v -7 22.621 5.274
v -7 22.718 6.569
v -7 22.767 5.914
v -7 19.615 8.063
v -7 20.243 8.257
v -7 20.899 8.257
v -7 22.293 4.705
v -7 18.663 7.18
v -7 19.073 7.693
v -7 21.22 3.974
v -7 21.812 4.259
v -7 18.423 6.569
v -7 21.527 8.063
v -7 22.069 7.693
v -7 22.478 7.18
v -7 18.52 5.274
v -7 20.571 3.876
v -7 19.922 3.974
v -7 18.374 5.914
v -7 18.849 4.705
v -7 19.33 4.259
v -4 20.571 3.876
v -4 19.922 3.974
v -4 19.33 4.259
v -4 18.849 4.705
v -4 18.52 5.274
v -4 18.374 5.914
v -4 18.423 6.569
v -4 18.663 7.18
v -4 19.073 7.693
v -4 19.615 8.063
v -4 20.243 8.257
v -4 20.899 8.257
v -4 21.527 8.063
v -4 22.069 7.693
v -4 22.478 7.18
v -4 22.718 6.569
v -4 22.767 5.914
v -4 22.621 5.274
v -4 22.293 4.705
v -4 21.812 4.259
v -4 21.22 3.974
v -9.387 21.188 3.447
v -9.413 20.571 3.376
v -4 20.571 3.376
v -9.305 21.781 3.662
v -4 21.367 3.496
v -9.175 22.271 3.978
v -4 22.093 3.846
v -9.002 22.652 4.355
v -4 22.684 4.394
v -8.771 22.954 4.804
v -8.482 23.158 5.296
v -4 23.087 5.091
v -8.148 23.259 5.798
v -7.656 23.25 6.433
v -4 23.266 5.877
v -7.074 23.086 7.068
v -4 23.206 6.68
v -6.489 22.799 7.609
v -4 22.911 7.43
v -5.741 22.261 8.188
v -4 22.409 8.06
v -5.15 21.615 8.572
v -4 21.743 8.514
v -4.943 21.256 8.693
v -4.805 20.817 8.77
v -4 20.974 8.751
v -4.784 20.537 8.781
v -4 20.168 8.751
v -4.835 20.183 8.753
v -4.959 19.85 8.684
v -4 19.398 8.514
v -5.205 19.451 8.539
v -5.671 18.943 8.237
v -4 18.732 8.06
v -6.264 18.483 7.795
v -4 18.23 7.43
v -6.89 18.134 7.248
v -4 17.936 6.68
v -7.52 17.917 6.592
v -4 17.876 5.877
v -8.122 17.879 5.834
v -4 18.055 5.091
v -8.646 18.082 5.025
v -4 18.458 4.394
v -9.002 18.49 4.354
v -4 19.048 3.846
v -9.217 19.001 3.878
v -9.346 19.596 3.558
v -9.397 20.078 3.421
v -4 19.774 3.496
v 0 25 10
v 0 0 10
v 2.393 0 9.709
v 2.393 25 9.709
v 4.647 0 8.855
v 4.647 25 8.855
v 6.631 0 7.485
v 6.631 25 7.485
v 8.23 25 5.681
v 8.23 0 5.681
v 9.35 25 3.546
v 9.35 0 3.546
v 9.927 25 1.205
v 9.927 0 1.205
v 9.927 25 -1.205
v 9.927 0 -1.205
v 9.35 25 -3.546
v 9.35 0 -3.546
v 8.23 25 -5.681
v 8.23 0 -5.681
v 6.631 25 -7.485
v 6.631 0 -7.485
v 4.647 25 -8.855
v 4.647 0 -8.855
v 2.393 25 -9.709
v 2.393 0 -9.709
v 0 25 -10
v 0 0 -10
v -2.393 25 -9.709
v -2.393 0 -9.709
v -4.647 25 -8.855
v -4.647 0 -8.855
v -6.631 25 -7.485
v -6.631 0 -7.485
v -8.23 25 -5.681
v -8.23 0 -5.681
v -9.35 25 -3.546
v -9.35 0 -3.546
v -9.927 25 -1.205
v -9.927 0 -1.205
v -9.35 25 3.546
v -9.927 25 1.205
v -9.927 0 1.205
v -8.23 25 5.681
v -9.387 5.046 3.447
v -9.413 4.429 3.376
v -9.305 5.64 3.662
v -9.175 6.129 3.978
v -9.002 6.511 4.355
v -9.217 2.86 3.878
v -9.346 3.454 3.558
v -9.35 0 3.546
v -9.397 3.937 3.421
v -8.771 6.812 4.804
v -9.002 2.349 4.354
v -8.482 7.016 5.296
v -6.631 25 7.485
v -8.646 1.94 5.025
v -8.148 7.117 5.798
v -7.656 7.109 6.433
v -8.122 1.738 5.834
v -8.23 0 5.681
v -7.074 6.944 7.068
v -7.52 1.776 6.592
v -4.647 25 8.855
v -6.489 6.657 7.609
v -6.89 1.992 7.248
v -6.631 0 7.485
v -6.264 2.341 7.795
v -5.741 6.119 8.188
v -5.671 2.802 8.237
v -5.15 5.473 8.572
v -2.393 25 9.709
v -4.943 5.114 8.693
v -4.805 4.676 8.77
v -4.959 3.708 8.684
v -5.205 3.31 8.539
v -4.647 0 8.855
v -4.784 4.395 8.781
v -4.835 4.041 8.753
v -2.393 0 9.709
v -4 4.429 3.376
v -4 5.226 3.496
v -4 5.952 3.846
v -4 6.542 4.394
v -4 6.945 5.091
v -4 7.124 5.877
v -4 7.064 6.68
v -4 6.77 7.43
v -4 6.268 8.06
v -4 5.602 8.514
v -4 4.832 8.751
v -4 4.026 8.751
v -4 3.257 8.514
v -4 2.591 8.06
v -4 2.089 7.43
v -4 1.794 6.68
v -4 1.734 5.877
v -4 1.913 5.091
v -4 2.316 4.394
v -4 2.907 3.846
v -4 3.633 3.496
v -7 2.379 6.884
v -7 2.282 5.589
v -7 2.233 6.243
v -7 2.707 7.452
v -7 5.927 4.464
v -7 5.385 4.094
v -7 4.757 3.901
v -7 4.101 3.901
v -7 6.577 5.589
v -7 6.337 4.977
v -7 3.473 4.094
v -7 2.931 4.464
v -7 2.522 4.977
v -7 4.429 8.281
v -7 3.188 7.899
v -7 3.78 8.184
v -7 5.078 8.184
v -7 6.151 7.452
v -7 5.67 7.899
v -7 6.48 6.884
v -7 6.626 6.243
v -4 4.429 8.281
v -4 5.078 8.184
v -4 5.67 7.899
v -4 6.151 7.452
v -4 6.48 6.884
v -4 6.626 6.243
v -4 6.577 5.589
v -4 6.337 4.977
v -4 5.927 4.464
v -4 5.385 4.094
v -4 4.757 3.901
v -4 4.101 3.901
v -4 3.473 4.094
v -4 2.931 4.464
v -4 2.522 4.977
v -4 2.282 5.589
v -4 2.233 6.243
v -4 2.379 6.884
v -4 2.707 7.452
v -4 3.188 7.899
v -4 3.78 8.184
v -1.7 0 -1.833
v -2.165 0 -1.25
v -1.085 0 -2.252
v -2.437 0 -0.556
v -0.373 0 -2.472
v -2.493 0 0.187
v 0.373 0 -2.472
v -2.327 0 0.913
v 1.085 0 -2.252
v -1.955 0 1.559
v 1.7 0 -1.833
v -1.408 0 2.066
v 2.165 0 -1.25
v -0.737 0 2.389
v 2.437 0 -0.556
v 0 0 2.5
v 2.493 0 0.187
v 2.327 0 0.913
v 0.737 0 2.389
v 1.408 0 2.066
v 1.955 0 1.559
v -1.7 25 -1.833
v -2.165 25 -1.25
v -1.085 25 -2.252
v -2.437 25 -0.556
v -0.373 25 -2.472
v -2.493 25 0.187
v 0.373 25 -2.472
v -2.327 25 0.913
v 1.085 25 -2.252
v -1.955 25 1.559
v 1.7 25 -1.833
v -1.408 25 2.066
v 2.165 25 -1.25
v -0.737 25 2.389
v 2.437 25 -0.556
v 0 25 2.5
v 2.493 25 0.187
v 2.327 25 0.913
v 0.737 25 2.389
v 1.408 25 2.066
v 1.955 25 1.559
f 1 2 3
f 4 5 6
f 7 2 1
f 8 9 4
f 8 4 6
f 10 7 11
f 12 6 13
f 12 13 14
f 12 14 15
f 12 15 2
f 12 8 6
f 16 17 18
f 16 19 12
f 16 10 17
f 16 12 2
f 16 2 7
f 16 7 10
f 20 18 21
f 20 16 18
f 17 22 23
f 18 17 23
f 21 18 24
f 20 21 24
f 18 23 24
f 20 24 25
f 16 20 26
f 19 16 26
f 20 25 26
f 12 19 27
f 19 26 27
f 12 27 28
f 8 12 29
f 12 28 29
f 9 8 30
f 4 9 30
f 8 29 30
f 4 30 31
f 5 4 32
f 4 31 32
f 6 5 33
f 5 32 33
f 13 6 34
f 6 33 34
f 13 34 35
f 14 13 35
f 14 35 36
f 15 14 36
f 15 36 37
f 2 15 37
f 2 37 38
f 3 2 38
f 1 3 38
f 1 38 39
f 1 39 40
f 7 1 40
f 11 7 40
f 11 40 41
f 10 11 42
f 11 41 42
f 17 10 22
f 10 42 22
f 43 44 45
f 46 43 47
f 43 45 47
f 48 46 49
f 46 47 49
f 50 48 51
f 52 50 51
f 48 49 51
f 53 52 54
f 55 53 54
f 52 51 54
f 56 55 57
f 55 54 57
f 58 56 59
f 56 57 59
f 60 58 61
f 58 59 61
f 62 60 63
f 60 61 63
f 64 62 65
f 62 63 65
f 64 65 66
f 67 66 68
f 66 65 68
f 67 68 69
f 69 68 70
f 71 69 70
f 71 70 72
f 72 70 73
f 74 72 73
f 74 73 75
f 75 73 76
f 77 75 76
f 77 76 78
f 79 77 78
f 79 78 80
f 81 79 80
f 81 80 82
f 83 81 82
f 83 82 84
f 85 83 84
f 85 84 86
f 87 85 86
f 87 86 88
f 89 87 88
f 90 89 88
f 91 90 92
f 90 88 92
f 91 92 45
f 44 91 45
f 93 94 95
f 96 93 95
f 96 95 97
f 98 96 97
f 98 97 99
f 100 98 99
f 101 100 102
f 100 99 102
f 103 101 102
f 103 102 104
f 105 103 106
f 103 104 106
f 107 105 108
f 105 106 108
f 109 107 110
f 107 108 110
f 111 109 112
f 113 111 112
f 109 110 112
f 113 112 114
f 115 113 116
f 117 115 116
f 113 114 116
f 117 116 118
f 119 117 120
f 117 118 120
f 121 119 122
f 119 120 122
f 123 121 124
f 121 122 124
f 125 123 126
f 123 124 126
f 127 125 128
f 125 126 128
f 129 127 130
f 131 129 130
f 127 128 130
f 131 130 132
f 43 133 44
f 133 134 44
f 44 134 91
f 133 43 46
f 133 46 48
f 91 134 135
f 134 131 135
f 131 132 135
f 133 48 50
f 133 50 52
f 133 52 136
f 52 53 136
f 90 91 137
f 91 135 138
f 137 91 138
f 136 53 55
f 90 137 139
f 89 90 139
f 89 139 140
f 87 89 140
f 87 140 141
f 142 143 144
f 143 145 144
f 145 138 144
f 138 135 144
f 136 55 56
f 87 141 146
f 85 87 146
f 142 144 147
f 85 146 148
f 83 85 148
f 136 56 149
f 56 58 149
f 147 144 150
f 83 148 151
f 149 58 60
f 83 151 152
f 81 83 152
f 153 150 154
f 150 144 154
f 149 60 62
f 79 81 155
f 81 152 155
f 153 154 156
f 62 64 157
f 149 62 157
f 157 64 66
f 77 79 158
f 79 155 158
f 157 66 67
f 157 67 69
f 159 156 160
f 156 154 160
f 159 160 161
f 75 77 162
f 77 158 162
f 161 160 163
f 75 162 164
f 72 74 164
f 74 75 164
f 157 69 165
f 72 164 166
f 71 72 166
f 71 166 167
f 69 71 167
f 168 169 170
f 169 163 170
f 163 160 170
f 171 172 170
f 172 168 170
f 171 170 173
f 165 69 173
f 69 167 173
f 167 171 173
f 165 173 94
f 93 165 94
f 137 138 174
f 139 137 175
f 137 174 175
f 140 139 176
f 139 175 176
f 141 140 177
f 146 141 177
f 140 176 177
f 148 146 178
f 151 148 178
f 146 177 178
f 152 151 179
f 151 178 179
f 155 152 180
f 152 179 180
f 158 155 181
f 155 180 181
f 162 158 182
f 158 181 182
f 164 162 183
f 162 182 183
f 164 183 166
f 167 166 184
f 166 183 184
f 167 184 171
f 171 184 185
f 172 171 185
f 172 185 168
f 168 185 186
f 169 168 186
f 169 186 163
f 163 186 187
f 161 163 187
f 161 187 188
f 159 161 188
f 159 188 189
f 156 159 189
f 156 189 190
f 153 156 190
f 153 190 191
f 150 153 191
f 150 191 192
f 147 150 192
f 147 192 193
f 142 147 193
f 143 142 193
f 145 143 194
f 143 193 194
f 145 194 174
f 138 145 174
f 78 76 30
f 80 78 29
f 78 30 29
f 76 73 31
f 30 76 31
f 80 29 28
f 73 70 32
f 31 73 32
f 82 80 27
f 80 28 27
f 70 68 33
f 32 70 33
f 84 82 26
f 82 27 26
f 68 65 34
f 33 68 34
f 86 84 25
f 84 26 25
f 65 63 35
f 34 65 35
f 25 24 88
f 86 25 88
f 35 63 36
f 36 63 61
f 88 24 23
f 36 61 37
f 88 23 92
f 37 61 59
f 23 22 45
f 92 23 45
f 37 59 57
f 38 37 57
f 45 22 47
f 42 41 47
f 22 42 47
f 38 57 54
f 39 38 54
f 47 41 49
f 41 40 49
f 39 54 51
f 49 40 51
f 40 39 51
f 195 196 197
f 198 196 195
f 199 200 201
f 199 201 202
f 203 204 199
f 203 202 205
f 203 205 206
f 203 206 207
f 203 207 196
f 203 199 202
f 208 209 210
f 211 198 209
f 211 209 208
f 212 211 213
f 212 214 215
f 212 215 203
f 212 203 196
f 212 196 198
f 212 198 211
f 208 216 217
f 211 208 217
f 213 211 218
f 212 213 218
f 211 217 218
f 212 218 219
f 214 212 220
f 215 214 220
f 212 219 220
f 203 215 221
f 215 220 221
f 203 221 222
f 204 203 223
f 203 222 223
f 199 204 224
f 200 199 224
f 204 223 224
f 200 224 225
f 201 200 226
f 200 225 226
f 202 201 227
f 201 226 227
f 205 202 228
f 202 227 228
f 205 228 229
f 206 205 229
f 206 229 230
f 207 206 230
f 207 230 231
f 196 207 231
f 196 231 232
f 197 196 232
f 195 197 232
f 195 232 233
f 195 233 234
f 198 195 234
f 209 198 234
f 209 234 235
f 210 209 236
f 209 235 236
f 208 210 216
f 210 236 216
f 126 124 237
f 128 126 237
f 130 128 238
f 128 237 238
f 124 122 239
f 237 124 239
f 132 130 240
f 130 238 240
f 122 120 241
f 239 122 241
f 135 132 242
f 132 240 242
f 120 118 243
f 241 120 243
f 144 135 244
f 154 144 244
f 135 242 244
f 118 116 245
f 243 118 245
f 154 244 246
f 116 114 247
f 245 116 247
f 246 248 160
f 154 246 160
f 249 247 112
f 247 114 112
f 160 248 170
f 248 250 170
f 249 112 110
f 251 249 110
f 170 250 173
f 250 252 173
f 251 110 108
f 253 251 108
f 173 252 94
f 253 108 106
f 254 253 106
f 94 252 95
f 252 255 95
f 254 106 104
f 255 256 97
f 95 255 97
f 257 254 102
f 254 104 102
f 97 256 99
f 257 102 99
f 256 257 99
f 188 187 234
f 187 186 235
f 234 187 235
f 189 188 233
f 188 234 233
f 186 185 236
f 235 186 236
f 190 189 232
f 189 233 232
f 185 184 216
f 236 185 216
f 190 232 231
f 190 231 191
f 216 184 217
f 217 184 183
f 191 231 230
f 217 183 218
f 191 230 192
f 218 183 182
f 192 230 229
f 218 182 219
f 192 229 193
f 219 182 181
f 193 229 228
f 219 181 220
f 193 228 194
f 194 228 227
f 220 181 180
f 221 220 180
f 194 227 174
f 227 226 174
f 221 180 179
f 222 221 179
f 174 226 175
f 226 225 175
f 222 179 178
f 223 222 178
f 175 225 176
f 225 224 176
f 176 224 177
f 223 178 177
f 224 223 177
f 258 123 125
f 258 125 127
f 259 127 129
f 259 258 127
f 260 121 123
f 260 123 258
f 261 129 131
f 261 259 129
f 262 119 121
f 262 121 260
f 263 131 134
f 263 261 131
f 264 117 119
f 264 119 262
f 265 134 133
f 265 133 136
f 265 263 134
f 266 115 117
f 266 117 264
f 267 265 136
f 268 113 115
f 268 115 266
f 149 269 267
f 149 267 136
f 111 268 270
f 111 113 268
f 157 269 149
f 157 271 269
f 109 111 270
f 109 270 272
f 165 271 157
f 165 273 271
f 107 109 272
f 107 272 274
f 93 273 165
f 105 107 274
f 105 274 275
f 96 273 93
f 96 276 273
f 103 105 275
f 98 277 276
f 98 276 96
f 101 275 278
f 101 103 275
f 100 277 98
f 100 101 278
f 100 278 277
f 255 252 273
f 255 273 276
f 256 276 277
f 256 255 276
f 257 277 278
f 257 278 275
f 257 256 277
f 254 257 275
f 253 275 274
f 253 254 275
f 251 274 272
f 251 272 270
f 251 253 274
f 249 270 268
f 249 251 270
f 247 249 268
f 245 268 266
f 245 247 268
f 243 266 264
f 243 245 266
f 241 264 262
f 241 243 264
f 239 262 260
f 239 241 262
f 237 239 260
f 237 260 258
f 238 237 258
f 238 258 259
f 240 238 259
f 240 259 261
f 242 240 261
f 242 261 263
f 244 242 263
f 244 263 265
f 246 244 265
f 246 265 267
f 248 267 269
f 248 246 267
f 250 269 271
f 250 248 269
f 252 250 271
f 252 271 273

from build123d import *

# Parameters (mm, degrees)
SKETCH1_R           = 10
SKETCH1_R_2         = 2.5
BOSS_EXTRUDE1_DEPTH = 25
CUT_EXTRUDE1_START  = -4
SKETCH2_R           = 2.702701275
CUT_EXTRUDE1_DEPTH  = 25.722813233
SKETCH3_R           = 2.202701275
BOSS_EXTRUDE2_DEPTH = 3


with BuildPart() as part:
    # Sketch1 → Boss-Extrude1 (new body)
    with BuildSketch(Plane(origin=(0, 0, 0), x_dir=(1, 0, 0), z_dir=(0, 1, 0))):
        with Locations(Location((0, 0, 0), (0, 0, 270))):
            Circle(SKETCH1_R)
        with Locations(Location((0, 0, 0), (0, 0, 270))):
            Circle(SKETCH1_R_2, mode=Mode.SUBTRACT)
    extrude(amount=BOSS_EXTRUDE1_DEPTH)

    # Sketch2 → Cut-Extrude1 (cut, through all)
    with BuildSketch(Plane(origin=(0, 0, 0), x_dir=(0, 0, -1), z_dir=(1, 0, 0)).offset(CUT_EXTRUDE1_START)):
        with Locations((-6.078771431, 20.570801258)):
            Circle(SKETCH2_R)
        with Locations((-6.078771431, 4.429198742)):
            Circle(SKETCH2_R)
    extrude(amount=-CUT_EXTRUDE1_DEPTH, mode=Mode.SUBTRACT)

    # Sketch3 → Boss-Extrude2 (add)
    with BuildSketch(Plane.ZY.offset(4)):
        with Locations((6.078771431, 4.429198742)):
            Circle(SKETCH3_R)
        with Locations(Location((6.078771431, 20.570801258, 0), (0, 0, 180))):
            Circle(SKETCH3_R)
    extrude(amount=BOSS_EXTRUDE2_DEPTH)


solid = part.part
